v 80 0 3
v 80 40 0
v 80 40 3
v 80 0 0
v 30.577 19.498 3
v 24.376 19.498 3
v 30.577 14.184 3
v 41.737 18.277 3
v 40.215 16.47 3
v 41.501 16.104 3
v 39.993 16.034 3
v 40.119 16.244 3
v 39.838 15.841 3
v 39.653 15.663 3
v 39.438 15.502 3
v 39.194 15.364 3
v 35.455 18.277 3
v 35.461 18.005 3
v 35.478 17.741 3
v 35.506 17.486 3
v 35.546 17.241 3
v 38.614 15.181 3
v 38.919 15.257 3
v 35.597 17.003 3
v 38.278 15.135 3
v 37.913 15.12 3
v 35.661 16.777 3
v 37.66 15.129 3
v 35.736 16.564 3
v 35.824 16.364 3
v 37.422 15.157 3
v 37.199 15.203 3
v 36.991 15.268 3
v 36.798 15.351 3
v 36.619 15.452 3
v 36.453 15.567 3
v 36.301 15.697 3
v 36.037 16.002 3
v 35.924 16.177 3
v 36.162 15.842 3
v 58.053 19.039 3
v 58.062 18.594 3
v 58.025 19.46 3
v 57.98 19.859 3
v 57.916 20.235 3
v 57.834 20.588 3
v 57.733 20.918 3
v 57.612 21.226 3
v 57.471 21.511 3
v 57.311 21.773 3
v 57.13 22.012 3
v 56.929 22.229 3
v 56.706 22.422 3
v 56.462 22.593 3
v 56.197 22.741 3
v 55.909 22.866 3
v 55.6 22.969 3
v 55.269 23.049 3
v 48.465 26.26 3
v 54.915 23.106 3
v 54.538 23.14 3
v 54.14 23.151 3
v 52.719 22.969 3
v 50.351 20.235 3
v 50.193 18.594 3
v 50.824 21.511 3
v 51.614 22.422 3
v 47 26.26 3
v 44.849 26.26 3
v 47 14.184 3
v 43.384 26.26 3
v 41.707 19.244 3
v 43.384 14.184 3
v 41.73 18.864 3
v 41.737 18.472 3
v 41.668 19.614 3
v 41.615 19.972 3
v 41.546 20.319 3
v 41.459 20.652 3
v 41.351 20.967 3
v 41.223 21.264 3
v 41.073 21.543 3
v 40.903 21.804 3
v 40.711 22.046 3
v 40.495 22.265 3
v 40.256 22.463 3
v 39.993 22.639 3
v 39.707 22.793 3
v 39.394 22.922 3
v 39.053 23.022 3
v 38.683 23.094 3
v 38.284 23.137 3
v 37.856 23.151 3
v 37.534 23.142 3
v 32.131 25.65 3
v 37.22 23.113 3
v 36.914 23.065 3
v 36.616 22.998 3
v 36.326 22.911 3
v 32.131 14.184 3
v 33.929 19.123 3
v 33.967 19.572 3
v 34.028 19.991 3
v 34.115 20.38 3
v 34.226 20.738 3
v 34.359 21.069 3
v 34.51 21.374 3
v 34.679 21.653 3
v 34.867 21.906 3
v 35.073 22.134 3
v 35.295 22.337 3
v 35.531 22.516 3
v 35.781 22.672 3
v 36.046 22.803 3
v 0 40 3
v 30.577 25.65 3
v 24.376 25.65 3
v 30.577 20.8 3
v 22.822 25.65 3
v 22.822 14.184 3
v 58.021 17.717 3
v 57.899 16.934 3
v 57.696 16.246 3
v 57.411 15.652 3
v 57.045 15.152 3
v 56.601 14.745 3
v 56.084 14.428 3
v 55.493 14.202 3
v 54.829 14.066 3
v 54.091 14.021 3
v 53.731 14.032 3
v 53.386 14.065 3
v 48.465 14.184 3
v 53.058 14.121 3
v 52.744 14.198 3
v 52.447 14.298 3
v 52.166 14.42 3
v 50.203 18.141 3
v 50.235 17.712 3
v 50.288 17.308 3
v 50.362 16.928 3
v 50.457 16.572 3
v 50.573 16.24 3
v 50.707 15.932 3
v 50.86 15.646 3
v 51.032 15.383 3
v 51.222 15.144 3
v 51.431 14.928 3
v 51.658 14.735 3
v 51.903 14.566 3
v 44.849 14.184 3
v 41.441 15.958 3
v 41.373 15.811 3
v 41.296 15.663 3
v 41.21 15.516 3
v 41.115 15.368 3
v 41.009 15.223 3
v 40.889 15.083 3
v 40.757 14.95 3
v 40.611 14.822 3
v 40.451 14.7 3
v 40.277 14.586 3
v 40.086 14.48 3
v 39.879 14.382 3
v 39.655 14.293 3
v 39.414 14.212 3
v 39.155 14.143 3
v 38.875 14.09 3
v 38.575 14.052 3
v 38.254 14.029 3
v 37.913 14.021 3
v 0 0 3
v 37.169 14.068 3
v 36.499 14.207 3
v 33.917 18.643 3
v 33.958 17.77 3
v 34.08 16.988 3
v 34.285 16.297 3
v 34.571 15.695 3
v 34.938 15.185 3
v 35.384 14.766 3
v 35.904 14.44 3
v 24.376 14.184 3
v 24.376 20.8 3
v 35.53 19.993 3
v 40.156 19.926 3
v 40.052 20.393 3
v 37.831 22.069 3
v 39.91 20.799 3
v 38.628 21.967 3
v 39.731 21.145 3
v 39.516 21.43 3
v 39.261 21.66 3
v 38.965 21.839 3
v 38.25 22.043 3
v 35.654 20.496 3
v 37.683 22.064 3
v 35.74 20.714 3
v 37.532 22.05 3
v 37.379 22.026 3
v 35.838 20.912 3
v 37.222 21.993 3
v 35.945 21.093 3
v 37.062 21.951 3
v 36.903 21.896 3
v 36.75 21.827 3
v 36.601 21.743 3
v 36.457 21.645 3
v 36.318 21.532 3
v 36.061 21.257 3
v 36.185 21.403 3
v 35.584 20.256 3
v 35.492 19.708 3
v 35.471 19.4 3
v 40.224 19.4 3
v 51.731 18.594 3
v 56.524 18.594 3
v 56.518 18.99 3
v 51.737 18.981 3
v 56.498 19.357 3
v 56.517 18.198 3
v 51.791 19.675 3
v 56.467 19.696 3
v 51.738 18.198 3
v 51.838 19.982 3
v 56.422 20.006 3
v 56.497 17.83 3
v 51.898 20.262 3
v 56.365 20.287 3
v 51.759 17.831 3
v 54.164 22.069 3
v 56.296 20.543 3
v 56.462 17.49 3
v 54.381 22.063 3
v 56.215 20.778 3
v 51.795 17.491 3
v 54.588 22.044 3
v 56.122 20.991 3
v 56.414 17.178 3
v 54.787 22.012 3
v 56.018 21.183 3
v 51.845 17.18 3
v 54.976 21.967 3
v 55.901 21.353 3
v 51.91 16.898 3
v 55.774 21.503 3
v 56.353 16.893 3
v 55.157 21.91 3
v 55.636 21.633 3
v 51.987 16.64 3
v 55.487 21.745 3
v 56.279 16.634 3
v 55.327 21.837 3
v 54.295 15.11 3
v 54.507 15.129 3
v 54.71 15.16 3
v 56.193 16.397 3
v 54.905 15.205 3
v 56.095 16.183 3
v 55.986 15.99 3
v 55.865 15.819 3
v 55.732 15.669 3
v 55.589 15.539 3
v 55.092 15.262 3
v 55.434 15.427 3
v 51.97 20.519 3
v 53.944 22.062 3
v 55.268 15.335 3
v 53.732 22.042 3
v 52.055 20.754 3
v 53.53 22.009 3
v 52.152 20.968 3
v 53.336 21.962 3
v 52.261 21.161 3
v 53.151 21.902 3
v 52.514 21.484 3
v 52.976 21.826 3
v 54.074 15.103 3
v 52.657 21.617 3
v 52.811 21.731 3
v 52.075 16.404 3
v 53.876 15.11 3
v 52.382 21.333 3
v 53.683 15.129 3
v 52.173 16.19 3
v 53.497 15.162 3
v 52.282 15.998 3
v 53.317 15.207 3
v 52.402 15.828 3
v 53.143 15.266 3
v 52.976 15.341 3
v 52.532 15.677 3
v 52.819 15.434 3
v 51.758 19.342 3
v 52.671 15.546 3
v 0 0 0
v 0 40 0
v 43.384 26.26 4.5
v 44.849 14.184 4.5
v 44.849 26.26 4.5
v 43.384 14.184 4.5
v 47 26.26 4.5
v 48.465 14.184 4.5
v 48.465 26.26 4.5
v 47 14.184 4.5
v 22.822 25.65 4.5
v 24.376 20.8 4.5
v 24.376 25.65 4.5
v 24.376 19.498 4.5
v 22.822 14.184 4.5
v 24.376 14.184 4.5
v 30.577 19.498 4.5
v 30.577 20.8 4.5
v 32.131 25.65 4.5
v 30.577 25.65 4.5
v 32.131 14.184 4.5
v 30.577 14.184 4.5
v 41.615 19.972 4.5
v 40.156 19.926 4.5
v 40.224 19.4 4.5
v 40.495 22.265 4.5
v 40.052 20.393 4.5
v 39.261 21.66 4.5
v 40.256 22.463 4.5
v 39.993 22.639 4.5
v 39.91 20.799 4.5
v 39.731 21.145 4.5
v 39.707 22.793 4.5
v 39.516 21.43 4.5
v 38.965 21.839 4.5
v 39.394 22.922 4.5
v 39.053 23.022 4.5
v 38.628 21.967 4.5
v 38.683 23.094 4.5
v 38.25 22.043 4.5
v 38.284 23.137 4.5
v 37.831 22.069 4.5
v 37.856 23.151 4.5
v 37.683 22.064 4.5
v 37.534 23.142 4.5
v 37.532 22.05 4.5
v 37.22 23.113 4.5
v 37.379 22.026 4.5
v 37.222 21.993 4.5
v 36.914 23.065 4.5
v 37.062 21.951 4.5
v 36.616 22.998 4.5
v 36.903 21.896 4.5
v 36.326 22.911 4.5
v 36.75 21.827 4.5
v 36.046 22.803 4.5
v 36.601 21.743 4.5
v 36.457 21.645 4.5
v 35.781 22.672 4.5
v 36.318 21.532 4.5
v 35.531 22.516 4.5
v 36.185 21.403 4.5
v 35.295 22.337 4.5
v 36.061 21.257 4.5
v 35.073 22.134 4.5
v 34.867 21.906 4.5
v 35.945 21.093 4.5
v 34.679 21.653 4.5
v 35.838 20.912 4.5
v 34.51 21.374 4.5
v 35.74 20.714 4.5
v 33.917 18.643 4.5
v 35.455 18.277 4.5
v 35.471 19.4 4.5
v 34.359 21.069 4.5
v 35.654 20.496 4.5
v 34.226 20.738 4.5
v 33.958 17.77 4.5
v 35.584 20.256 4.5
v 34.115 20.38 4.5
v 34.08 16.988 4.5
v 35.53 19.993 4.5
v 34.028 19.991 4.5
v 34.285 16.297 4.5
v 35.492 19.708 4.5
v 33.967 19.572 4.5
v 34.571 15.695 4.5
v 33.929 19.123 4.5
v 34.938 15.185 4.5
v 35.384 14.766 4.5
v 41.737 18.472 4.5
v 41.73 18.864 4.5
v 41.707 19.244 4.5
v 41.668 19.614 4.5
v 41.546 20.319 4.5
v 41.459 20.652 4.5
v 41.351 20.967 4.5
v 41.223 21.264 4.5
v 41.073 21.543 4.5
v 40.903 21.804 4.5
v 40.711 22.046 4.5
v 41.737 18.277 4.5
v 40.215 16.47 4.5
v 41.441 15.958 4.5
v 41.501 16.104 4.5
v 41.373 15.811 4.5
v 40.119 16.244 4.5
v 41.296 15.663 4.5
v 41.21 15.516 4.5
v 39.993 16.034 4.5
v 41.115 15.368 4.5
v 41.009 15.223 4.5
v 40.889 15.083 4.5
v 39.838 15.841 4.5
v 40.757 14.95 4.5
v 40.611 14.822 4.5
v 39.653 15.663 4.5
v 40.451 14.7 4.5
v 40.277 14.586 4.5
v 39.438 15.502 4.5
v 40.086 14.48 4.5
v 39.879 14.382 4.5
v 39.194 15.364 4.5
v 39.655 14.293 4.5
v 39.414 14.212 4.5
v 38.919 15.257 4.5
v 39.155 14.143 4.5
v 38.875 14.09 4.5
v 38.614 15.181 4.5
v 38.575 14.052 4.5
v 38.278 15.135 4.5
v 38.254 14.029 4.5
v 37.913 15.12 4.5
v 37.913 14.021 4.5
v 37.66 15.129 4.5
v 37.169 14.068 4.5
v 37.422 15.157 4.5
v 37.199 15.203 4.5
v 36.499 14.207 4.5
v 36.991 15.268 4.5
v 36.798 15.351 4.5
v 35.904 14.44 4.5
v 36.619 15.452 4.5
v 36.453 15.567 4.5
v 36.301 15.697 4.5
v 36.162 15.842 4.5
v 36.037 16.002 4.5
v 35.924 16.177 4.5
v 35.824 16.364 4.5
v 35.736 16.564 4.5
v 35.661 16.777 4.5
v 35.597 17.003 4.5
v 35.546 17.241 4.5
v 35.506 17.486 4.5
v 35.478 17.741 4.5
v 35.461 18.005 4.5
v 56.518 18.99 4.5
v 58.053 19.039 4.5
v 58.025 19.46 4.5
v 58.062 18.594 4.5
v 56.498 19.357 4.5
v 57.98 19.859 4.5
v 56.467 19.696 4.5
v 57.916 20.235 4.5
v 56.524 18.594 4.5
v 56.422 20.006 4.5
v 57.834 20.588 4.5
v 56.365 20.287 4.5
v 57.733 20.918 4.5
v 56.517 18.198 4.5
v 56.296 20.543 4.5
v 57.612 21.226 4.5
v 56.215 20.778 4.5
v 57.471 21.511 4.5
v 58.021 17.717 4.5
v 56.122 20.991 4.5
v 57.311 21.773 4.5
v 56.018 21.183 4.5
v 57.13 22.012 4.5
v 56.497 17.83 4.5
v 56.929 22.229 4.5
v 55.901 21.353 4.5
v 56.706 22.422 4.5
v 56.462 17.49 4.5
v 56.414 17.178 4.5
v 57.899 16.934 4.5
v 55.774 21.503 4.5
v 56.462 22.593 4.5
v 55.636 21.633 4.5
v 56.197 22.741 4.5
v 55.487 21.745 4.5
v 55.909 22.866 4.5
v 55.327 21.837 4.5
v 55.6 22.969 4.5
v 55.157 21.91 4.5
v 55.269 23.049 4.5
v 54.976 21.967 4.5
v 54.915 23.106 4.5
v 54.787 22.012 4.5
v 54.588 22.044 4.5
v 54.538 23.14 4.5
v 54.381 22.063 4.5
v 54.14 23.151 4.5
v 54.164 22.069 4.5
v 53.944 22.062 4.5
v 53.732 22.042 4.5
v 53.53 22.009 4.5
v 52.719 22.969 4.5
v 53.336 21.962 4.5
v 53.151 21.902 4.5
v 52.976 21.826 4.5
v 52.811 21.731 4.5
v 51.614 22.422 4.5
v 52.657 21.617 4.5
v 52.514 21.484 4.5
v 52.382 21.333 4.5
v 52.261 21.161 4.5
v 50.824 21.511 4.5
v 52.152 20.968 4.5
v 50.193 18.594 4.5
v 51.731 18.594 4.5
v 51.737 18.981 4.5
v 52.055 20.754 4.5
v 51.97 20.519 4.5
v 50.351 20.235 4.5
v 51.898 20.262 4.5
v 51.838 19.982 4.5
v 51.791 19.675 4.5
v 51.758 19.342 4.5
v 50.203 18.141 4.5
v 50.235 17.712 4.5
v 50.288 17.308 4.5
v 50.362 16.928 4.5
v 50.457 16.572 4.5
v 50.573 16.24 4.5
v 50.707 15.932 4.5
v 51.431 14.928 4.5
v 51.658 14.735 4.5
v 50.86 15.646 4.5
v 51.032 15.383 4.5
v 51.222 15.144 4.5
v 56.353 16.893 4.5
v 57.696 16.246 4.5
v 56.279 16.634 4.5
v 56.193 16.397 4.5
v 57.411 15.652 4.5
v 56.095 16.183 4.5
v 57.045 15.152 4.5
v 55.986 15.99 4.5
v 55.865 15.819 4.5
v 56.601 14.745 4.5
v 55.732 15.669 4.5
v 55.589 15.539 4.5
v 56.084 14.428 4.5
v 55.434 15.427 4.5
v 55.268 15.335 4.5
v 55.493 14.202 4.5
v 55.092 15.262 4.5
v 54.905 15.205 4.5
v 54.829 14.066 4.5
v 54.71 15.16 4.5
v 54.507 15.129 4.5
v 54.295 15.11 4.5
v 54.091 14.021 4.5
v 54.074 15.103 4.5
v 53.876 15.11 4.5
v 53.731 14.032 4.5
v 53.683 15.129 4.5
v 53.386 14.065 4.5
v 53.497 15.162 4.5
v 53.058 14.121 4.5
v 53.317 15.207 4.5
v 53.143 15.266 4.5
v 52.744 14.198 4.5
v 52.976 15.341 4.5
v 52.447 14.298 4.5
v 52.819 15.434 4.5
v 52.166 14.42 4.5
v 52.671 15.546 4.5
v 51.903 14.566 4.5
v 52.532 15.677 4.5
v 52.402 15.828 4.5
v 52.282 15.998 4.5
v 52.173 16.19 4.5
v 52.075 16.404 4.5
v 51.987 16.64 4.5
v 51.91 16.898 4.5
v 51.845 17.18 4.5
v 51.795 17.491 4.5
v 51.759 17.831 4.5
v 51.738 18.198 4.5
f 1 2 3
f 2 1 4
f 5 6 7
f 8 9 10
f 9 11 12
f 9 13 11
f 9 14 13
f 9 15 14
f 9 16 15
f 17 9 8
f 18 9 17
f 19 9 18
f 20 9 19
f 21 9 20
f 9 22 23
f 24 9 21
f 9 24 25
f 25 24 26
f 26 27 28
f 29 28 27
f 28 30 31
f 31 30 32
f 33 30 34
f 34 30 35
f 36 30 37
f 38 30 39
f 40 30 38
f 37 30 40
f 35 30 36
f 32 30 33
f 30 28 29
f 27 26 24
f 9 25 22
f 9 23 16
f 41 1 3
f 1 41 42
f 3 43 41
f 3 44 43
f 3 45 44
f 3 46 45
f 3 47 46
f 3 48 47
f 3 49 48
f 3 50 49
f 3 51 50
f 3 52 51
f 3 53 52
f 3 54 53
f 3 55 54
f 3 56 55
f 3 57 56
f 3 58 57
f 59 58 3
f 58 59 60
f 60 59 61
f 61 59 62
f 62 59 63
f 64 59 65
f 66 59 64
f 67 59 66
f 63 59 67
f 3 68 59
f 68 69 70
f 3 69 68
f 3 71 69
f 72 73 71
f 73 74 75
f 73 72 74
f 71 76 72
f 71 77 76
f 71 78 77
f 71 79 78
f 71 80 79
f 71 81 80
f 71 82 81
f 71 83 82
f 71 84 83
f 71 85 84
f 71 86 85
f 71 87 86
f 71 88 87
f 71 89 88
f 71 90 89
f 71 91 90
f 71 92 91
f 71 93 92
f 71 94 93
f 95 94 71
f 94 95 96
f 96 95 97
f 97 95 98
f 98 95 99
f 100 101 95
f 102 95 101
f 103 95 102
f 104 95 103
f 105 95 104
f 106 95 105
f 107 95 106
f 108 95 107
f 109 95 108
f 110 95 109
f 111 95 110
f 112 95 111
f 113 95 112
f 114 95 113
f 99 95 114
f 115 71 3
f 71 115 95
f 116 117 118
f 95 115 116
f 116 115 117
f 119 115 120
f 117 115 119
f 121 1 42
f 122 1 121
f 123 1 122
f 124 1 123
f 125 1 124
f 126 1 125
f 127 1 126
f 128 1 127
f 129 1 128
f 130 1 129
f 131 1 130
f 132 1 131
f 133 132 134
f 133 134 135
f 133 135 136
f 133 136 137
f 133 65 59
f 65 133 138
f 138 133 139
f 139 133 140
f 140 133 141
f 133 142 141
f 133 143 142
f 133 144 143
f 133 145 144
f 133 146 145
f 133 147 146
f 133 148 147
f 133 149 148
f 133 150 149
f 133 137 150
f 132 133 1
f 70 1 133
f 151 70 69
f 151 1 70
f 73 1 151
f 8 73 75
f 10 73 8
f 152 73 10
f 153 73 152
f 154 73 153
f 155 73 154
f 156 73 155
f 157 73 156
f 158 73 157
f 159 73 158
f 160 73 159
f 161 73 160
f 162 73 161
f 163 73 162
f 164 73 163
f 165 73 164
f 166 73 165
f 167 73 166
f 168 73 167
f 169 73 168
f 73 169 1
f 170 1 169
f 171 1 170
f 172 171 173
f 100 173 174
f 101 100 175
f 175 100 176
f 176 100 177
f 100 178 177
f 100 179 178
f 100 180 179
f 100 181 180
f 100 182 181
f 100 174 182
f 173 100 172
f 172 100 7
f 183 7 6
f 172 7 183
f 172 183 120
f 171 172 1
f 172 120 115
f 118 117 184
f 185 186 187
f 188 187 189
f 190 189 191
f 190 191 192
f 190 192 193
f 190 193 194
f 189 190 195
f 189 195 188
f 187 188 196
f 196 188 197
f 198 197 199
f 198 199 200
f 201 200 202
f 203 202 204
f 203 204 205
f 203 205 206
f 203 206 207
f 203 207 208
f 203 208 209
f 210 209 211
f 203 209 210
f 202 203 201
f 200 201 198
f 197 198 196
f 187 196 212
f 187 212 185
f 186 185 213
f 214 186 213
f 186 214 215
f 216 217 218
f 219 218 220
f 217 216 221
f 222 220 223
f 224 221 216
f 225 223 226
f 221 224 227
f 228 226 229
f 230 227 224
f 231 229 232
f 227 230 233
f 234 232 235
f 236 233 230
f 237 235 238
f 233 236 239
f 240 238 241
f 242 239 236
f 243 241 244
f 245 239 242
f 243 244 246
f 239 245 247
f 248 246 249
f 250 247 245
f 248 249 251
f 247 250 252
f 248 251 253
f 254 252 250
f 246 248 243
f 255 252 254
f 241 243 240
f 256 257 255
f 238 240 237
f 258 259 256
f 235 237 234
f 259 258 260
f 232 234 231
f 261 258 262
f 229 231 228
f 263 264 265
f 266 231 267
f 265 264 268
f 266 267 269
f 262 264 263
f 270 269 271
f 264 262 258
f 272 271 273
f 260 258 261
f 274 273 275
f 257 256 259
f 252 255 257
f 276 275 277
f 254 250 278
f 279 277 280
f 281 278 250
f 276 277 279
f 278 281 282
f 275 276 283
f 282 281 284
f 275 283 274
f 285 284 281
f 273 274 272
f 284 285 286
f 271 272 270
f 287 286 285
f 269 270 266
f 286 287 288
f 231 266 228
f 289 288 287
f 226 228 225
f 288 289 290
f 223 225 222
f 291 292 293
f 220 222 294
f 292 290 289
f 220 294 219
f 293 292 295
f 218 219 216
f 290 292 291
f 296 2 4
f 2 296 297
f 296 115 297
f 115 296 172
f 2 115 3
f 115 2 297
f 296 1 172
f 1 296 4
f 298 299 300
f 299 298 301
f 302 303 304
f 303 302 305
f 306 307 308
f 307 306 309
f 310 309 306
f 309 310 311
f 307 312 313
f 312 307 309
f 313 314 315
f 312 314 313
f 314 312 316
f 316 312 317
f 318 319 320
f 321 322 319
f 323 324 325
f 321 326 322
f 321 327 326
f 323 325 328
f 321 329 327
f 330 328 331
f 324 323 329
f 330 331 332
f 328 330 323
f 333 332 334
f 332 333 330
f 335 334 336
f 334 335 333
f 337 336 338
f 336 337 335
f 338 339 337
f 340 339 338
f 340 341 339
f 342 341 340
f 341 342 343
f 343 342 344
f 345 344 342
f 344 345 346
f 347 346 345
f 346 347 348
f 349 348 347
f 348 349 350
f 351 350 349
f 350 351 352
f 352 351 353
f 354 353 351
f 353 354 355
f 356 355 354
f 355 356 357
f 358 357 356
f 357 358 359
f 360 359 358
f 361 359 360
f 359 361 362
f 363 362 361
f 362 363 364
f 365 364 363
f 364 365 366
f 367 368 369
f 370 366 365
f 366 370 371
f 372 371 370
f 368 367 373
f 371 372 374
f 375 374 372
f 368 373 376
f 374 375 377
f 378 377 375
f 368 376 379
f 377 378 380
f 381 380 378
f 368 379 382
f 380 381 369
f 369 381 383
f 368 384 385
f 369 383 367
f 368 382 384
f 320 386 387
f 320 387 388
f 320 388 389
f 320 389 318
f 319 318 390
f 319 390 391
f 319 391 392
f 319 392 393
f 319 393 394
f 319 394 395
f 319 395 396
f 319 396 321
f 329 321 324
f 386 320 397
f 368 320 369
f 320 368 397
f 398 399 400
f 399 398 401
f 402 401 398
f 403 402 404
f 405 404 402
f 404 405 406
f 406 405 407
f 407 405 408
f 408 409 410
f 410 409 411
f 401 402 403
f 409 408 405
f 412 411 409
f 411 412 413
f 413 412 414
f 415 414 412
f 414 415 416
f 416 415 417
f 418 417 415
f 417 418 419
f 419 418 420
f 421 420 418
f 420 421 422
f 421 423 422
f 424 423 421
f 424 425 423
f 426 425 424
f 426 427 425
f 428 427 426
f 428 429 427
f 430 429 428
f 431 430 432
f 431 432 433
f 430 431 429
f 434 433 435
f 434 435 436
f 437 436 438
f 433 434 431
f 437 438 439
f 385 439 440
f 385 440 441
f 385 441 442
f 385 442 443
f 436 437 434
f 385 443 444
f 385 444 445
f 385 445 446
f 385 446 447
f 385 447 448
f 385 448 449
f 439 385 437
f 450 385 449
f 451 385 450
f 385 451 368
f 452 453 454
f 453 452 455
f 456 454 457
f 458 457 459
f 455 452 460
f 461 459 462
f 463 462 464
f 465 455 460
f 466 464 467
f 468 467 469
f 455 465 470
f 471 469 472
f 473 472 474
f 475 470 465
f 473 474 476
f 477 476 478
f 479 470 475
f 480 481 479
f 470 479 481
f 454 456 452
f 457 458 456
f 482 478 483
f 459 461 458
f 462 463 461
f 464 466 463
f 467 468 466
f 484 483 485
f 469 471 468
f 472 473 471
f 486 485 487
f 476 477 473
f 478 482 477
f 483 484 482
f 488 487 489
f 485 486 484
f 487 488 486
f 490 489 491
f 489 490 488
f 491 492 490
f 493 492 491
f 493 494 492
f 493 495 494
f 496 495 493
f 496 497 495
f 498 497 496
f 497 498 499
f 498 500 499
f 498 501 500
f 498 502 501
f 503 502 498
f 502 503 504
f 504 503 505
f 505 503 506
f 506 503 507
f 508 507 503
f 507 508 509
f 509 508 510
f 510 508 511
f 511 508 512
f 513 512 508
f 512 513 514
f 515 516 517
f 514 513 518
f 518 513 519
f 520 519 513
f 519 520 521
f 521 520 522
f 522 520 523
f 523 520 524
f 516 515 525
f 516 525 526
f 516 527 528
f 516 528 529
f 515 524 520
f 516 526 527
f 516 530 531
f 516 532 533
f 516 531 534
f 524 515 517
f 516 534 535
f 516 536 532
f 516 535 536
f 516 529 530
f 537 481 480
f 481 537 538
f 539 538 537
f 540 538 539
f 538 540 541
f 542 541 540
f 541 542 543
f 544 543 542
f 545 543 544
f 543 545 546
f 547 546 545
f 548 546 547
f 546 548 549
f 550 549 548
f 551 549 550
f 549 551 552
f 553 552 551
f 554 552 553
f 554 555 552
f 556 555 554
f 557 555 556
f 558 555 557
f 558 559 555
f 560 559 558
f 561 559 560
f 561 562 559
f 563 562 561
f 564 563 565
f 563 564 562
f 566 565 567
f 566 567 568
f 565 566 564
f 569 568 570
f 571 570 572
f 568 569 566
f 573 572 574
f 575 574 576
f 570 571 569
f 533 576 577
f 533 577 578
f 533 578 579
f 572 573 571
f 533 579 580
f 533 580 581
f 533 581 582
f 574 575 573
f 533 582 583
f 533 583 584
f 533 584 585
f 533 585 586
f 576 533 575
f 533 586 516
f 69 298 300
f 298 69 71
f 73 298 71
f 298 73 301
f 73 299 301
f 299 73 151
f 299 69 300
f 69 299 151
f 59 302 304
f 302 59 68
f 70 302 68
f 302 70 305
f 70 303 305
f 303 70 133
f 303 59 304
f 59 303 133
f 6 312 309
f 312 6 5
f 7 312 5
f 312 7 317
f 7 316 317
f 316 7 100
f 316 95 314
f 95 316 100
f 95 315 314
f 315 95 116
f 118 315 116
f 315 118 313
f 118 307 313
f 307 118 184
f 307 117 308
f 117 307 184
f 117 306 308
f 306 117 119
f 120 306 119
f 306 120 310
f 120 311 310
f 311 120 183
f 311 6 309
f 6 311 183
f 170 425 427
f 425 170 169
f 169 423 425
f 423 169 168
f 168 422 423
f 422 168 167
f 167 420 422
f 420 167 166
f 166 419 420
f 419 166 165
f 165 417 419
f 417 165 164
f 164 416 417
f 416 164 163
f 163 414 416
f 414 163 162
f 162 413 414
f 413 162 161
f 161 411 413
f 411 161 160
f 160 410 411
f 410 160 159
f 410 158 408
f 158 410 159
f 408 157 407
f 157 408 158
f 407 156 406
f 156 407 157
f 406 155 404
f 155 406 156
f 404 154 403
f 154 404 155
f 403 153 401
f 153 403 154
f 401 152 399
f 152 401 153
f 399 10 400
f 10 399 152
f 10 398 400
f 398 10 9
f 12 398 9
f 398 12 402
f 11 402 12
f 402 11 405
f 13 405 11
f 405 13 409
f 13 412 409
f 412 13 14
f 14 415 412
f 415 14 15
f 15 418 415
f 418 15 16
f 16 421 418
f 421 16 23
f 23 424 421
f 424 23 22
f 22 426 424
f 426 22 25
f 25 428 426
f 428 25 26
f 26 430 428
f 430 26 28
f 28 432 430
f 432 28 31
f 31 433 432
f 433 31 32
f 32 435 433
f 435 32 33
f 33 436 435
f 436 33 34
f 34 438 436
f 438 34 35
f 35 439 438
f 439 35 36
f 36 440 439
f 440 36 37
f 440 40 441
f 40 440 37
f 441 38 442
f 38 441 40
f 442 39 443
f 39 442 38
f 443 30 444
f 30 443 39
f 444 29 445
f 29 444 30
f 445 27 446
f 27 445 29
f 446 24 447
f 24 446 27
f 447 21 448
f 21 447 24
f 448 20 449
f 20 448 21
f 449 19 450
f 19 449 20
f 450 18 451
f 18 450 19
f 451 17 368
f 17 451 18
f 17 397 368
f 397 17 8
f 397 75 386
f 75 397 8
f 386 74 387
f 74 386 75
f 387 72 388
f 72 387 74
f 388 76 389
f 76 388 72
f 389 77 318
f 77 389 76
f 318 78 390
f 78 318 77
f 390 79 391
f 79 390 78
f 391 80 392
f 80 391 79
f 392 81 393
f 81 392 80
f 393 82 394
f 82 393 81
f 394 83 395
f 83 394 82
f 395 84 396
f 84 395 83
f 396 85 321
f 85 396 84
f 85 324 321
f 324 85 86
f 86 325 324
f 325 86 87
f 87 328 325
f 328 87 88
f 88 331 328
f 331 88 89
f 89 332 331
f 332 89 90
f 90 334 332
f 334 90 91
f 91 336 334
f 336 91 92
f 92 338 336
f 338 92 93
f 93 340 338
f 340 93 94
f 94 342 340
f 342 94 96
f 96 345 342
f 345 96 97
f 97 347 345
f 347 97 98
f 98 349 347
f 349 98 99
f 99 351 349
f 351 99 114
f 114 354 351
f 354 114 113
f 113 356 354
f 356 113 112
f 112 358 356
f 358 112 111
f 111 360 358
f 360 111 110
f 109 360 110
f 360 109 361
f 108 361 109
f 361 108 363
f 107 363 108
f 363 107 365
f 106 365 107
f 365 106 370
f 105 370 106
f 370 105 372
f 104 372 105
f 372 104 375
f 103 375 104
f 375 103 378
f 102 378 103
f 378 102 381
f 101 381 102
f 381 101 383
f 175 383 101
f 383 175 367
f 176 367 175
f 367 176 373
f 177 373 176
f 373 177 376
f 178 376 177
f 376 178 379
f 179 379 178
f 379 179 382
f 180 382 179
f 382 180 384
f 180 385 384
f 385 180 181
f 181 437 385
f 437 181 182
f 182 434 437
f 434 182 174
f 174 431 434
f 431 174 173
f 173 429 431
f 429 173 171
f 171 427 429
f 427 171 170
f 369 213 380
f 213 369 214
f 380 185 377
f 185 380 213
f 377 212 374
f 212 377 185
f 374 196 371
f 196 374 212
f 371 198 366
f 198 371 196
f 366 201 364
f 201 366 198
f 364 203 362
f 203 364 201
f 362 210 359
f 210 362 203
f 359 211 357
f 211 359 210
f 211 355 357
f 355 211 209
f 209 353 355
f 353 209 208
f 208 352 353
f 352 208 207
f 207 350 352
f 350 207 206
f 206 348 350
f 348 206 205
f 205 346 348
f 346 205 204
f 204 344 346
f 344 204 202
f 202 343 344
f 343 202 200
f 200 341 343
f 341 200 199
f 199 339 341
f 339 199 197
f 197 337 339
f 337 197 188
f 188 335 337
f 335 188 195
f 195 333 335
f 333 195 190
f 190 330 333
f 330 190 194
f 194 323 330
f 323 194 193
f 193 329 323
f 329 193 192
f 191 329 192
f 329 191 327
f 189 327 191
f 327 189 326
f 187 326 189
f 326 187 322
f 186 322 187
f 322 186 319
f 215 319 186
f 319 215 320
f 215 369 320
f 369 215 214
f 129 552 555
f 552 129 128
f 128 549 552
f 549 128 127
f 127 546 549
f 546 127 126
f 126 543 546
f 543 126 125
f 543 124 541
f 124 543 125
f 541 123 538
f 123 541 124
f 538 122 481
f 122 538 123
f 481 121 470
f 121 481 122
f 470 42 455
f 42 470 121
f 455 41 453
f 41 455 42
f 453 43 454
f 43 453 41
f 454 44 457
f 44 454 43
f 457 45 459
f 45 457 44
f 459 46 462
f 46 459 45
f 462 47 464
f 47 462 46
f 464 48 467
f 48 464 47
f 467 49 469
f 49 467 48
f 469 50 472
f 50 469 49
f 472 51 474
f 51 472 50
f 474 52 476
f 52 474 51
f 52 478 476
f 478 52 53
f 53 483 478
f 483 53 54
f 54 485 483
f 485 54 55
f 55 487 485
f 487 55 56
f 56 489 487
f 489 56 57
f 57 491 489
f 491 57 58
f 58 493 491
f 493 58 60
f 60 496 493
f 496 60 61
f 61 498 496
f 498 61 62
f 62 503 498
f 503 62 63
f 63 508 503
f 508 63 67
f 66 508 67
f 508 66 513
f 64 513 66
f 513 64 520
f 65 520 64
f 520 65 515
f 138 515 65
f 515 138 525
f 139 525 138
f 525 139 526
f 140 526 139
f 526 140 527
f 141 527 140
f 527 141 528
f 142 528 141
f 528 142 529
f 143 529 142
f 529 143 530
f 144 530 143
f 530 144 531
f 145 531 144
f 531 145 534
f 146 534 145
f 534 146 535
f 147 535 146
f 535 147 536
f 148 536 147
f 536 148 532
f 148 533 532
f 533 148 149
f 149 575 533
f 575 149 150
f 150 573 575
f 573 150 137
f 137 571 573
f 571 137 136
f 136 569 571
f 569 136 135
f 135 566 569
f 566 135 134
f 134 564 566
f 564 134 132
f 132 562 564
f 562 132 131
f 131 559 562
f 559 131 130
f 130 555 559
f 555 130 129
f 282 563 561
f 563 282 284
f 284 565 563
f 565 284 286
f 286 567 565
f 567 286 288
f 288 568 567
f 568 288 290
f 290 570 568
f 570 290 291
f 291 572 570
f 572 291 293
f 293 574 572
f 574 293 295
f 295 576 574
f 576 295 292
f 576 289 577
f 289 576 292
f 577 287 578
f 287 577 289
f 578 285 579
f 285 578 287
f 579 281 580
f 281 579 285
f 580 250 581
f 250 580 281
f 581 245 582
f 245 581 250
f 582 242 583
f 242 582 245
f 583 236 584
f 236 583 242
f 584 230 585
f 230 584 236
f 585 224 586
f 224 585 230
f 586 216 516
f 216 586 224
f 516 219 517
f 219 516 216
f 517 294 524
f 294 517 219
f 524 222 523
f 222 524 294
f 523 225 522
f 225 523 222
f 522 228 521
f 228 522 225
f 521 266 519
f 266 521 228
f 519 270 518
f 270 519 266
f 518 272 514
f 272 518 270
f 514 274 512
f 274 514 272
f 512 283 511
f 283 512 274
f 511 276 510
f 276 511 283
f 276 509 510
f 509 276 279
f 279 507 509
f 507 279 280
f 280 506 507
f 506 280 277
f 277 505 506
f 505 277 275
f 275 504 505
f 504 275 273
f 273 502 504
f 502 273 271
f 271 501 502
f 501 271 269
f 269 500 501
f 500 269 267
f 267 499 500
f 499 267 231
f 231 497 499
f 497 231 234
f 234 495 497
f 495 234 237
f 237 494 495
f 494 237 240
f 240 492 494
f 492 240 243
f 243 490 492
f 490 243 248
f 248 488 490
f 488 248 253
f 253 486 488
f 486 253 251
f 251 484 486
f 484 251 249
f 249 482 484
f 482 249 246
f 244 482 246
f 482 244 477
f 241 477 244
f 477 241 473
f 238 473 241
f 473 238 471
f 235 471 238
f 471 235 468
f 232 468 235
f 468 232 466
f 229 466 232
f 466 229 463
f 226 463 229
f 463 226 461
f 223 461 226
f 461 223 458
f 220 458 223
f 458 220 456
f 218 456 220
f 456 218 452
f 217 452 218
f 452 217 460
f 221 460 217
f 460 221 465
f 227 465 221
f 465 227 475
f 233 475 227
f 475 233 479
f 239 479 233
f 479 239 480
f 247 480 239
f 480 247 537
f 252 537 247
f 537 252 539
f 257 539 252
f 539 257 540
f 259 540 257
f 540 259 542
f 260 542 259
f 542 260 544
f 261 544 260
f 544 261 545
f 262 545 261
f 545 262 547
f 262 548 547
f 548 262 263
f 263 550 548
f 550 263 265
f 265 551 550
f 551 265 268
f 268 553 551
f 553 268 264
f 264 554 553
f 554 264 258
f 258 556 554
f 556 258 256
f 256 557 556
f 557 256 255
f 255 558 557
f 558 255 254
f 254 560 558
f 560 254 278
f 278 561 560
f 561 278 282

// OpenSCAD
// Yantra4D wrapper — Text Plaque
// Rectangular base with raised or inset text

message = "Hello";
font_size = 12;
text_depth = 1.5;
base_width = 80;
base_height = 40;
base_thickness = 3;
raised = true;
fn = 0;
render_mode = 0;

$fn = fn > 0 ? fn : 32;

if (raised) {
    // Raised text: base + extruded text on top
    union() {
        cube([base_width, base_height, base_thickness]);
        translate([base_width / 2, base_height / 2, base_thickness])
            linear_extrude(text_depth)
                text(message, size = font_size, halign = "center", valign = "center");
    }
} else {
    // Inset text: base with text carved in
    difference() {
        cube([base_width, base_height, base_thickness]);
        translate([base_width / 2, base_height / 2, base_thickness - text_depth])
            linear_extrude(text_depth + 0.1)
                text(message, size = font_size, halign = "center", valign = "center");
    }
}
